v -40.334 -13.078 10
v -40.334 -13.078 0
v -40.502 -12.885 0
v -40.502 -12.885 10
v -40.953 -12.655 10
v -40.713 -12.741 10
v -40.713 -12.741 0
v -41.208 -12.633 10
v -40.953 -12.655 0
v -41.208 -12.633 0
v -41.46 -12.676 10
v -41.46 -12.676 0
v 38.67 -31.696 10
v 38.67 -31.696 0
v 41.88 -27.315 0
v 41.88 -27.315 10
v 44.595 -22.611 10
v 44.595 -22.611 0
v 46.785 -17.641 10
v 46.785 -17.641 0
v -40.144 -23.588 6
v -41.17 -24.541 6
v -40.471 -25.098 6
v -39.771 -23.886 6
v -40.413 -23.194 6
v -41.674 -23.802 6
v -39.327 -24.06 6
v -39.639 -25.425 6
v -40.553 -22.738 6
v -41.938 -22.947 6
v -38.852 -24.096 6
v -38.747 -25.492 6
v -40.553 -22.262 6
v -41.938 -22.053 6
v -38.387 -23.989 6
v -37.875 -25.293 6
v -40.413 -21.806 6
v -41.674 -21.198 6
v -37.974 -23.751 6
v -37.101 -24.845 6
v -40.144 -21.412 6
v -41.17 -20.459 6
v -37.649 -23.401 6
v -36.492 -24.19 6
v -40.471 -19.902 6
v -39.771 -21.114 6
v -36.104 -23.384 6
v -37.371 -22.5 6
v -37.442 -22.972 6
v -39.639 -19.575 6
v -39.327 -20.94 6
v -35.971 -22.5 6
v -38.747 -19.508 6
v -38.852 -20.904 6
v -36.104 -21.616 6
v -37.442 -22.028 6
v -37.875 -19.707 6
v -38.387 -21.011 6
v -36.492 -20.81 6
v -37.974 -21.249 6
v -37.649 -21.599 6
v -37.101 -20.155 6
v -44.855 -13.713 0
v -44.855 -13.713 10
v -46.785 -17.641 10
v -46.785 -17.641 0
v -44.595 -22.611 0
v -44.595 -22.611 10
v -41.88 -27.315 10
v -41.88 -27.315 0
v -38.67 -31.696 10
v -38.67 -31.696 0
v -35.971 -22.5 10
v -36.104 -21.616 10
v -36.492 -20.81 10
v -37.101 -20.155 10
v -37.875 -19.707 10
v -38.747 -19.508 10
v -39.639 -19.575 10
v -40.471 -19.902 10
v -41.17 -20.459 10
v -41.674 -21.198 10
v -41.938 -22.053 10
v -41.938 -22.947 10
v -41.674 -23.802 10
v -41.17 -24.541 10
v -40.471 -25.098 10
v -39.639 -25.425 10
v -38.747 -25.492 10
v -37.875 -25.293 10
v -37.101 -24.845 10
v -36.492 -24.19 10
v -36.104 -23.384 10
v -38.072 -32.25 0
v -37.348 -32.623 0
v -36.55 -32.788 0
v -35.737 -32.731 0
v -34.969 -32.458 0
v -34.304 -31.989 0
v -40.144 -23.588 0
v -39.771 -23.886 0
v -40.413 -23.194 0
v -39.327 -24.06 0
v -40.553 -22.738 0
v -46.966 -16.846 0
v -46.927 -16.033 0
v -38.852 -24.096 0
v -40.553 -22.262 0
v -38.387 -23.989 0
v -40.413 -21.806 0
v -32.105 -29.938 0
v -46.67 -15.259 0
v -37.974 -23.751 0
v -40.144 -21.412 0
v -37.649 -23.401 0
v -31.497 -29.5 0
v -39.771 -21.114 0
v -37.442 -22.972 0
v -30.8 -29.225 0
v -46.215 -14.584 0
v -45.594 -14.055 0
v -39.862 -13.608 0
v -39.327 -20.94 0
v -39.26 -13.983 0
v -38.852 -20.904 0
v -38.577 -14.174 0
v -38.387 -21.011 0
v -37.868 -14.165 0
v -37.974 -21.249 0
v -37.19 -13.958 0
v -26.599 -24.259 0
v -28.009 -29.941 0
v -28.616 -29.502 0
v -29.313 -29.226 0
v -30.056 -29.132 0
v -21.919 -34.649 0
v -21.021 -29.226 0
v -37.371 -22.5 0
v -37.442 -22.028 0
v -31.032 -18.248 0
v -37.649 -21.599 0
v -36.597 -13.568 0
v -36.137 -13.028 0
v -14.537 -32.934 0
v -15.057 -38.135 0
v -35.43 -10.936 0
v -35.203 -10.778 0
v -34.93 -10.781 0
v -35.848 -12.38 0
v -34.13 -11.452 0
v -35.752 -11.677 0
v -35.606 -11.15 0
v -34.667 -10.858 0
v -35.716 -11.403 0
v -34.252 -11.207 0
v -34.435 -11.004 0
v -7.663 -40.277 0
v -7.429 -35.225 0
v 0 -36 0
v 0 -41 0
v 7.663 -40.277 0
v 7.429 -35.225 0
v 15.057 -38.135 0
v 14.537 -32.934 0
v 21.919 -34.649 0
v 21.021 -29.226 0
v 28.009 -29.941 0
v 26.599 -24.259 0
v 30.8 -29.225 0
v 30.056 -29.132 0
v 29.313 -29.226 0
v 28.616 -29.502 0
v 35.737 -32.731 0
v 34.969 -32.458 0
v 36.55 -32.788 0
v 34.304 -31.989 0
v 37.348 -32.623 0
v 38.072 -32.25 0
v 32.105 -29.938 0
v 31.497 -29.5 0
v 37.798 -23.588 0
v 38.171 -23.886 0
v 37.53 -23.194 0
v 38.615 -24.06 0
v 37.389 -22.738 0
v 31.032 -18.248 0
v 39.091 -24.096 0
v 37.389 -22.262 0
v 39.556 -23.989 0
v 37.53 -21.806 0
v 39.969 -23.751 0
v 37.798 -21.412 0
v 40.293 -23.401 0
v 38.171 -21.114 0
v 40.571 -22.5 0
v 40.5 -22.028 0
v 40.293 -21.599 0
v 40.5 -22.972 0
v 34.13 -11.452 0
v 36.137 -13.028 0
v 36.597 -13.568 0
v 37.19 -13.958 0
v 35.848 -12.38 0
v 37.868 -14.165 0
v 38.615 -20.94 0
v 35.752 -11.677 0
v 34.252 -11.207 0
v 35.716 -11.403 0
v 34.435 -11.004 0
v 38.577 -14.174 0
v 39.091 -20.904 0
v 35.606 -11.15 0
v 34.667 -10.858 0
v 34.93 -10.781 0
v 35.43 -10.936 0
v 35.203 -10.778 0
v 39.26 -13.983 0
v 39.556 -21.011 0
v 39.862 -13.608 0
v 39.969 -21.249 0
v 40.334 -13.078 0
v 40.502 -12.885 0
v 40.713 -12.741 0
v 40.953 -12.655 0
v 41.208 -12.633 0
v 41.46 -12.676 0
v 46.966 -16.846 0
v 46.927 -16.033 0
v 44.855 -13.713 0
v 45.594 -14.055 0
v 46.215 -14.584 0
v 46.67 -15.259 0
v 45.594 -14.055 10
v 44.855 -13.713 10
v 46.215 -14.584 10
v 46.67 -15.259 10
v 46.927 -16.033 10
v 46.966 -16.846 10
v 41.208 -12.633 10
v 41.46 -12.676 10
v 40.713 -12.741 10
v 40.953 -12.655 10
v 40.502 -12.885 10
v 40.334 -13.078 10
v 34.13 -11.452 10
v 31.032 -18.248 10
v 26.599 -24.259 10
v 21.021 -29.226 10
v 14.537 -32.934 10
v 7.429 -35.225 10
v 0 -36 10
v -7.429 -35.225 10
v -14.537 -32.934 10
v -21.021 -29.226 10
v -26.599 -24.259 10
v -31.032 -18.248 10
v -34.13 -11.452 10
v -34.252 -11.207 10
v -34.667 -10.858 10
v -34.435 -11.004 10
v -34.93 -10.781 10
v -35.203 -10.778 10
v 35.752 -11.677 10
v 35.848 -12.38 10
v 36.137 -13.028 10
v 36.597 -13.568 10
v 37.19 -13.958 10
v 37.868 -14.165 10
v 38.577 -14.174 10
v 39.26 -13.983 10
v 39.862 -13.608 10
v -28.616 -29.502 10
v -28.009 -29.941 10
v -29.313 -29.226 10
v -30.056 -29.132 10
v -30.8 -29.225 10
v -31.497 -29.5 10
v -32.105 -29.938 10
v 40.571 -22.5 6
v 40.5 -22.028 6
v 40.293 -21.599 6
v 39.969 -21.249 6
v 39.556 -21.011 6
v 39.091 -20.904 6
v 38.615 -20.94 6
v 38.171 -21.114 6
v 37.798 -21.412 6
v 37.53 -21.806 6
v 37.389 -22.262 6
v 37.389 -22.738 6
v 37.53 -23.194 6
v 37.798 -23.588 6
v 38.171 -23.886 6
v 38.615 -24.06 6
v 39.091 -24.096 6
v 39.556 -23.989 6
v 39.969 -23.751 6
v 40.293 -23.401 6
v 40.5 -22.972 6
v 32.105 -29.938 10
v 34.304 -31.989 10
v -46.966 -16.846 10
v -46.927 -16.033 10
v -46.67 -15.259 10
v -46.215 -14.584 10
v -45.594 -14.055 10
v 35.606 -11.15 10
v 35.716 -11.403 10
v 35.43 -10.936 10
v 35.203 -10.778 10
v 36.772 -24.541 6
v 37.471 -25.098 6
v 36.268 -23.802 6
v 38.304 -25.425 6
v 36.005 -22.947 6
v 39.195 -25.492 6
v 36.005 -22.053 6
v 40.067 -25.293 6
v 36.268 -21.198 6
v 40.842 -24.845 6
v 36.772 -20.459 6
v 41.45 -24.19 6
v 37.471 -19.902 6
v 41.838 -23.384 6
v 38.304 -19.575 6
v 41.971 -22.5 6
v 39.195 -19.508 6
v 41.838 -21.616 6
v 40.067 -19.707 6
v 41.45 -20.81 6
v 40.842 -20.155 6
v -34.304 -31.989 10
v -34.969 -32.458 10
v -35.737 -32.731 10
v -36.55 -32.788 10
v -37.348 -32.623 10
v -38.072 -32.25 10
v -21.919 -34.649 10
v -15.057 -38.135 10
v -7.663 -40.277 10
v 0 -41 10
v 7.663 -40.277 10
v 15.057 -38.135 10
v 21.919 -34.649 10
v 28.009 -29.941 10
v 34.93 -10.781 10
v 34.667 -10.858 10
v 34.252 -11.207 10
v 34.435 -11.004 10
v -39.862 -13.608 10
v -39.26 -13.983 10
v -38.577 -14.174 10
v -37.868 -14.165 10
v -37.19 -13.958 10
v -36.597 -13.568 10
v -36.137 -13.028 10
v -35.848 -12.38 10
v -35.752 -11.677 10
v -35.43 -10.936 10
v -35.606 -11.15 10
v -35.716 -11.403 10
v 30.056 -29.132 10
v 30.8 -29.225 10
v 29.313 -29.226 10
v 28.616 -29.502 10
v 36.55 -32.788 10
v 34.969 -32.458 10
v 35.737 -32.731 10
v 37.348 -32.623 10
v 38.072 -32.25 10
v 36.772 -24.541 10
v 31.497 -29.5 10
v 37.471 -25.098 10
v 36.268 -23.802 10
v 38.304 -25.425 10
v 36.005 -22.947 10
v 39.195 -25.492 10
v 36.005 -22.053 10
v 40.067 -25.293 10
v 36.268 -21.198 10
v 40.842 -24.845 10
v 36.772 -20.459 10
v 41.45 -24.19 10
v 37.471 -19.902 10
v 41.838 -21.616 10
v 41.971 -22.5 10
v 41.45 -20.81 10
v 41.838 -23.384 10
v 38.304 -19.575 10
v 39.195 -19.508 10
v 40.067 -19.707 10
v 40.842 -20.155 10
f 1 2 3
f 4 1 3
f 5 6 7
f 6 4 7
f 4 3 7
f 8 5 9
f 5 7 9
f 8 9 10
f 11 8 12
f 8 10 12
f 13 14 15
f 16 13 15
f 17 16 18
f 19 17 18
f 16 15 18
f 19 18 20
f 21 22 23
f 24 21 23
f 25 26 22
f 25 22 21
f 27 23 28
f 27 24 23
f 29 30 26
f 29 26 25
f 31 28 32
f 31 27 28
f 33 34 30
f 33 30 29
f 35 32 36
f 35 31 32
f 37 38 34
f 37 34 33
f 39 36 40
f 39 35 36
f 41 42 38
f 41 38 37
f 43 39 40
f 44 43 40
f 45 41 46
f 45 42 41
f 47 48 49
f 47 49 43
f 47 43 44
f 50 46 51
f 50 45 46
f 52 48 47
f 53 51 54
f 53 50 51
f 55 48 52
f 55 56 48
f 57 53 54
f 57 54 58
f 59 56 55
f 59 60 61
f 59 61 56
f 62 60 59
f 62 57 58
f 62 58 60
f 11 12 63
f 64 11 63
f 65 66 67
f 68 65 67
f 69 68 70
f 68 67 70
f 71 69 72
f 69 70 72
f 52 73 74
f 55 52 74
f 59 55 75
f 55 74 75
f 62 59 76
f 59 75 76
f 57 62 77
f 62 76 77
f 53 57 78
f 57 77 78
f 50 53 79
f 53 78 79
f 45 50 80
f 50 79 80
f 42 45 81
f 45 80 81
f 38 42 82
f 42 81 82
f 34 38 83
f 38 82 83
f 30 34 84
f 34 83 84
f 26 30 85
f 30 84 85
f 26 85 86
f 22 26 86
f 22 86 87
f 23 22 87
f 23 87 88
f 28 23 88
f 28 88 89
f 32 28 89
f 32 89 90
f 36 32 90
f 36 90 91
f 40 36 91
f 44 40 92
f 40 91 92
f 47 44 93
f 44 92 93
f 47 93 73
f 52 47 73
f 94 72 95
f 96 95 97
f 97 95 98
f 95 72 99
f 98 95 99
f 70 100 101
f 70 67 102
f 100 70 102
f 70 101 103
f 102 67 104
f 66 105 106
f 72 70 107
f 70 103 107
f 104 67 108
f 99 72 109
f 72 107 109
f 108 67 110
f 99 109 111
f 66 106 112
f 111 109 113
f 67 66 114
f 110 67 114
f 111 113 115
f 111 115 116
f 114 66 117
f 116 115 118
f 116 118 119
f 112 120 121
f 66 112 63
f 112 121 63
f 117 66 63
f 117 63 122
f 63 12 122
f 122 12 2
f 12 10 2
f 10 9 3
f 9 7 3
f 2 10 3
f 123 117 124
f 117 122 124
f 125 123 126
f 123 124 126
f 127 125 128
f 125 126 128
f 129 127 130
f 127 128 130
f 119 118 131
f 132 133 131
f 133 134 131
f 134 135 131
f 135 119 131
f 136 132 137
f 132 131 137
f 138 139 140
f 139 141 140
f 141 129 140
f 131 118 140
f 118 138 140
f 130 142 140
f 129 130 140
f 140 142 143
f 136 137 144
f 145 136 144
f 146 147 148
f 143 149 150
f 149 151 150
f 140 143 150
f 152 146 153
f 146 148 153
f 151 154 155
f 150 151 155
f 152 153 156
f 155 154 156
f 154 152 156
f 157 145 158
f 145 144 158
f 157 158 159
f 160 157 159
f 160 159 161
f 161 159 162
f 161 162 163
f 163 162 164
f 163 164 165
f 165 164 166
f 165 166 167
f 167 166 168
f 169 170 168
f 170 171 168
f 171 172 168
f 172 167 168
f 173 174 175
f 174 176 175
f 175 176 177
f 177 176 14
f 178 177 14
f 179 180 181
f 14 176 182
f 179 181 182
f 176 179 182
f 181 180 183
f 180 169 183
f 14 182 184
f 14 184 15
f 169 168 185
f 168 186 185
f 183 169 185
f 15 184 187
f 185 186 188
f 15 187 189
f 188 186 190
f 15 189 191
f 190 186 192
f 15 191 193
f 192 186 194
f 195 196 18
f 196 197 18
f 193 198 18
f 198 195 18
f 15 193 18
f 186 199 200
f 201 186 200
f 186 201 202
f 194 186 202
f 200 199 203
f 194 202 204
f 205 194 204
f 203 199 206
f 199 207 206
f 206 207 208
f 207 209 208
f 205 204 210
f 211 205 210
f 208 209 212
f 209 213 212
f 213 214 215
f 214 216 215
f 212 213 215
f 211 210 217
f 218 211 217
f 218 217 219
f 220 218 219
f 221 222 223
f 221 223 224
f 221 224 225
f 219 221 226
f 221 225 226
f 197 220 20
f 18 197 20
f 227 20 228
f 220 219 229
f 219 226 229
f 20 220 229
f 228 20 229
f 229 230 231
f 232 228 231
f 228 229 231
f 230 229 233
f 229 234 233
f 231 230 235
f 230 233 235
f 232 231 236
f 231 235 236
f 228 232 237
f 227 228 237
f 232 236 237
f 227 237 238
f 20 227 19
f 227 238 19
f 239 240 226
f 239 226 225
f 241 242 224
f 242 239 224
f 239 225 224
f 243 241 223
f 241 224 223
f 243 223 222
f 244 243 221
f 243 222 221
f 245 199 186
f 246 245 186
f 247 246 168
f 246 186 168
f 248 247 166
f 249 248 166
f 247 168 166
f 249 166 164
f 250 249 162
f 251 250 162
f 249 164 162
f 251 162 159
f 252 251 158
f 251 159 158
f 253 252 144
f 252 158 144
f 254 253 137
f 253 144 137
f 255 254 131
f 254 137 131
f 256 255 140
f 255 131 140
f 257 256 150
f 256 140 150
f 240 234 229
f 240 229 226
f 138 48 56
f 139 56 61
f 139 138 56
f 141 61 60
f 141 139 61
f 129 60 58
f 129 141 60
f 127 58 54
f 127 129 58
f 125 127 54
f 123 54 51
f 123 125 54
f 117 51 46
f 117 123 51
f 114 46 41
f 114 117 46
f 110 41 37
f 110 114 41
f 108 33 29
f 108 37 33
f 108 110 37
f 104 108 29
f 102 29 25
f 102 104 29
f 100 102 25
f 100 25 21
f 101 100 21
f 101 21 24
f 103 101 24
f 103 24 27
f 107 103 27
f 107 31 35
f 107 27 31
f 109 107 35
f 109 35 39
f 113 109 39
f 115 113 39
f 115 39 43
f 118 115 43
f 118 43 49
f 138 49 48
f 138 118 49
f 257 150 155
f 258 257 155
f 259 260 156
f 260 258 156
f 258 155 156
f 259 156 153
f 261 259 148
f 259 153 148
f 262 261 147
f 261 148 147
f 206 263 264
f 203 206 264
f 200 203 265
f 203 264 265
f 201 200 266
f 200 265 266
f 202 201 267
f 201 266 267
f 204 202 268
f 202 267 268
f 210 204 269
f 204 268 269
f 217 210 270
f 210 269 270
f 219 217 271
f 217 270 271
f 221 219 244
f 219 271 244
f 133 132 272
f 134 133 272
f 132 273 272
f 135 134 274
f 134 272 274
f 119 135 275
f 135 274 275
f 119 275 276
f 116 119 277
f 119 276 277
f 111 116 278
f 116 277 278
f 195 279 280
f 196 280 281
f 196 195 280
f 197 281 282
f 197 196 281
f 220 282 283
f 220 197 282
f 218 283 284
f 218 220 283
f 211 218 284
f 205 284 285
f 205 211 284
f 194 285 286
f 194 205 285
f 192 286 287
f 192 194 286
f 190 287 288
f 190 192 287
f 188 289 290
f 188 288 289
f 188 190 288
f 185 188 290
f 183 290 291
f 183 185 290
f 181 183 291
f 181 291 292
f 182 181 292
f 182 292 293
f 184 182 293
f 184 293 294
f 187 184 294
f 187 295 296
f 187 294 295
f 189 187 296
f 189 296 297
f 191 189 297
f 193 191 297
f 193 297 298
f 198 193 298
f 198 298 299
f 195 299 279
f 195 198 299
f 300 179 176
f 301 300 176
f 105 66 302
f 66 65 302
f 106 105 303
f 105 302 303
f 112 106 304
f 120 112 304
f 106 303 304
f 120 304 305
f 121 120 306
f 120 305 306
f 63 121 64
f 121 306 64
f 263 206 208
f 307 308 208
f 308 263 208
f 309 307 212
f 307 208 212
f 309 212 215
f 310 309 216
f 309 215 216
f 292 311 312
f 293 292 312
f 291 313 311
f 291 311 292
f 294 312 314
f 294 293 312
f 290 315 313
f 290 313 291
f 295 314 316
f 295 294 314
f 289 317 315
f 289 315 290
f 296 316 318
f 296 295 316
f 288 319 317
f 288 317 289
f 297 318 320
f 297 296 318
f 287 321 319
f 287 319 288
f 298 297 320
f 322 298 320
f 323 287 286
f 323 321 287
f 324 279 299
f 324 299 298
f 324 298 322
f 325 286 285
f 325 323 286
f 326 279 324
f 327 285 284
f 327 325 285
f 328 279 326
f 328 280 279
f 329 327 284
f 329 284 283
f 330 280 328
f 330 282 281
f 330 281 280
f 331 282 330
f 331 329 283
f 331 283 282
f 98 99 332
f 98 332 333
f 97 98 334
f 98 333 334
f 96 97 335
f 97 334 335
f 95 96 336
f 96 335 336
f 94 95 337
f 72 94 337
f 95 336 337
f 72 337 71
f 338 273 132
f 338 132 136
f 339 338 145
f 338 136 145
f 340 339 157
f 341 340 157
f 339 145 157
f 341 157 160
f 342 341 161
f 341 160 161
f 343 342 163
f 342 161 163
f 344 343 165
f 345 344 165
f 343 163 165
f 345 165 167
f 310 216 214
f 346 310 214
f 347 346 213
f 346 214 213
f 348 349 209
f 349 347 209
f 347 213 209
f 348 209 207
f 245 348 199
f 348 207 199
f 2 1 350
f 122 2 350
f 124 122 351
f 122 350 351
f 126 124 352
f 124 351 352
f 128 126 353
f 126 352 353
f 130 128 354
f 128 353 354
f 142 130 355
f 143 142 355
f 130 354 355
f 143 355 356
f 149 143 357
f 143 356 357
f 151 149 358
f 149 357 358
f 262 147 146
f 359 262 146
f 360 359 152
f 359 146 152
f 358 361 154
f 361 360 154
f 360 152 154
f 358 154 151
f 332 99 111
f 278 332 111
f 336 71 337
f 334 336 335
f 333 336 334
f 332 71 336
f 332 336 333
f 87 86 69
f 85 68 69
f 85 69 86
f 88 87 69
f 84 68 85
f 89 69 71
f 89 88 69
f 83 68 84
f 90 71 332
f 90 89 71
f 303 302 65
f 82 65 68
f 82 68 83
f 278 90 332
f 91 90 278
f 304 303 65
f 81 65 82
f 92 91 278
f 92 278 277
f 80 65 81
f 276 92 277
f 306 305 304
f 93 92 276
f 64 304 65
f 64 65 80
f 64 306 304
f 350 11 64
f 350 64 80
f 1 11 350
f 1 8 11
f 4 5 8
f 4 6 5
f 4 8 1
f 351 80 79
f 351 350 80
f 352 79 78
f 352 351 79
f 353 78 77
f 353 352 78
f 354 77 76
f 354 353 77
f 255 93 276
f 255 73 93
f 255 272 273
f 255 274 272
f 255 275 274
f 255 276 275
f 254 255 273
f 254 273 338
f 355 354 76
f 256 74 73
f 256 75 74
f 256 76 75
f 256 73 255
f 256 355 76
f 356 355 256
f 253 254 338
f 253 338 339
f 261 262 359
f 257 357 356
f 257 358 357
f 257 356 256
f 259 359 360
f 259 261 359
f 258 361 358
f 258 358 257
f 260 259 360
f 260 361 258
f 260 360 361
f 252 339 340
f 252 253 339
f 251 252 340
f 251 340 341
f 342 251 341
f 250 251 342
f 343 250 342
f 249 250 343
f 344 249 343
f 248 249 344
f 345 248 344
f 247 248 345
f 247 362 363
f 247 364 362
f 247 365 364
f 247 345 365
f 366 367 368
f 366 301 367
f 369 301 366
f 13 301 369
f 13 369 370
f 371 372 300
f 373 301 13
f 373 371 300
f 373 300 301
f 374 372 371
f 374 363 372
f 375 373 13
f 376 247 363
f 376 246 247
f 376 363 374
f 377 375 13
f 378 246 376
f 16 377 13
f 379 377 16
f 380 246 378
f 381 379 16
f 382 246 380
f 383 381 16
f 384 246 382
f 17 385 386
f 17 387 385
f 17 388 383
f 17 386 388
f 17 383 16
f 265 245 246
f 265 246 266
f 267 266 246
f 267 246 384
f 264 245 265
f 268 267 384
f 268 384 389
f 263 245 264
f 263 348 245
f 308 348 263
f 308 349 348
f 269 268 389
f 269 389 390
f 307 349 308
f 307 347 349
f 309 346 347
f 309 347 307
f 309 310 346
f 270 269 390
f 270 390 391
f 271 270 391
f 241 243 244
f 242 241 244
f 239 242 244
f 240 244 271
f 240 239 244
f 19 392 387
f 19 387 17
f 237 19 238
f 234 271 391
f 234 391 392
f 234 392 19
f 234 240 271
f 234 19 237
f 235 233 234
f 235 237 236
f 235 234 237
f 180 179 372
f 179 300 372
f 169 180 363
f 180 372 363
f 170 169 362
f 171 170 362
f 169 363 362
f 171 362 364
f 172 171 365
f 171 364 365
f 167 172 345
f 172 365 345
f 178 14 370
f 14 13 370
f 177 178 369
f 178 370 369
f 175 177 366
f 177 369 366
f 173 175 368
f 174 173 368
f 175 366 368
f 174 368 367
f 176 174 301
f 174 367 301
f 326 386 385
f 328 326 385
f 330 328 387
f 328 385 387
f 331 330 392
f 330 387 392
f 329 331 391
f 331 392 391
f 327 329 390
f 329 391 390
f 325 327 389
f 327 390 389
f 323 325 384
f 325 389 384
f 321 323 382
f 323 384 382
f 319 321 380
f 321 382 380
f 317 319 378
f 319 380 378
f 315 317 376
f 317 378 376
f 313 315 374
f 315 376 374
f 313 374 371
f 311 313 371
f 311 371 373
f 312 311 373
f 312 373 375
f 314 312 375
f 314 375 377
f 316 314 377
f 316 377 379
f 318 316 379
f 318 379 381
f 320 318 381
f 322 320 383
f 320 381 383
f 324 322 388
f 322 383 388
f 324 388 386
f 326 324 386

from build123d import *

# Parameters (mm, degrees)
SKETCH_1_R          = 1.6
EXTRUDE_1_DEPTH     = 10
SKETCH_2_R          = 2.5
CUT_EXTRUDE_1_DEPTH = 64.775363313
SKETCH_3_R          = 3
CUT_EXTRUDE_2_DEPTH = 4
FILLET_4_R          = 1
FILLET_5_R          = 3


with BuildPart() as part:
    # 草图1 → 凸台-拉伸1 (new body)
    with BuildSketch(Plane.XY):
        with BuildLine():
            Line((-34.426971215, -10.52538137), (-47.815237798, -14.618585236))
            ThreePointArc((-47.815237798, -14.618585236), (-43.301270189, -25), (-36.567685081, -34.099918003))
            Line((-36.567685081, -34.099918003), (-29.985501766, -27.961932763))
            ThreePointArc((-29.985501766, -27.961932763), (0, -41), (29.985501766, -27.961932763))
            Line((29.985501766, -27.961932763), (36.567685081, -34.099918003))
            ThreePointArc((36.567685081, -34.099918003), (43.301270189, -25), (47.815237798, -14.618585236))
            Line((47.815237798, -14.618585236), (34.426971215, -10.52538137))
            ThreePointArc((34.426971215, -10.52538137), (0, -36), (-34.426971215, -10.52538137))
        make_face()
        with Locations((-38.97114317, -22.5)):
            Circle(SKETCH_1_R, mode=Mode.SUBTRACT)
        with Locations((38.97114317, -22.5)):
            Circle(SKETCH_1_R, mode=Mode.SUBTRACT)
    extrude(amount=EXTRUDE_1_DEPTH)

    # 草图2 → 切除-拉伸1 (cut, through all)
    with BuildSketch(Plane.XY.offset(10)):
        with Locations((-38.252190239, -11.694868189)):
            Circle(SKETCH_2_R)
        with Locations((38.252190239, -11.694868189)):
            Circle(SKETCH_2_R)
    extrude(amount=-CUT_EXTRUDE_1_DEPTH, mode=Mode.SUBTRACT)

    # 草图3 → 切除-拉伸2 (cut)
    with BuildSketch(Plane.XY.offset(10)):
        with Locations((-38.97114317, -22.5)):
            Circle(SKETCH_3_R)
        with Locations((38.97114317, -22.5)):
            Circle(SKETCH_3_R)
    extrude(amount=-CUT_EXTRUDE_2_DEPTH, mode=Mode.SUBTRACT)

    # 圆角4
    # the kernel refuses this fillet: 1 mm, written as the material it takes off along each edge
    with BuildSketch(Plane(origin=(-34.426971215, -10.52538137, -2.466210045), x_dir=(-0.9563047559630324, -0.2923717047227467, 0), z_dir=(0, 0, 1))) as fillet_4_piece_1:
        with BuildLine():
            CenterArc((0.986484018, 1), FILLET_4_R, 181.548723167, 88.451276833)
            ThreePointArc((-0.013150685, 0.972972973), (-0.003287821, 0.486530921), (0, 0))
            Line((0, 0), (0.986484018, 0))
        make_face()
    extrude(amount=14.932420089, mode=Mode.SUBTRACT)
    with BuildSketch(Plane(origin=(34.426971215, -10.52538137, -2.466210045), x_dir=(-0.30526922048074906, -0.9522660883529749, 0), z_dir=(0, 0, 1))) as fillet_4_piece_2:
        with BuildLine():
            CenterArc((0.986576589, 0.999908672), FILLET_4_R, 180.774361584, 88.451276833)
            Line((-0.013332083, 0.986393924), (0, 0))
            ThreePointArc((0, 0), (0.486530921, 0.003287821), (0.973061841, 0))
        make_face()
    extrude(amount=14.932420089, mode=Mode.SUBTRACT)
    with BuildSketch(Plane(origin=(-40.642952128, -12.425797451, -2.135254916), x_dir=(0.42737008907787555, -0.9040767705021342, 0), z_dir=(0, 0, 1)), Plane(origin=(35.861428349, -10.963938927, -2.135254916), x_dir=(-0.1512474530257889, -0.9884959321885001, 0), z_dir=(0, 0, 1))) as fillet_4_piece_3:
        with BuildLine():
            CenterArc((0.866217493, -0.989523837), FILLET_4_R, 98.3007748, 73.398450401)
            Line((-0.123306344, -0.845154255), (0, 0))
            ThreePointArc((0, 0), (0.360923955, -0.026190408), (0.721847911, 0))
        make_face()
    extrude(amount=14.270509831, mode=Mode.SUBTRACT)
    with BuildSketch(Plane(origin=(-35.861428349, -10.963938927, -2.135254916), x_dir=(0.9563047559630329, 0.29237170472274493, 0), z_dir=(0, 0, 1)), Plane(origin=(40.642952128, -12.425797451, -2.135254916), x_dir=(0.9563047559630371, -0.2923717047227312, 0), z_dir=(0, 0, 1))) as fillet_4_piece_4:
        with BuildLine():
            CenterArc((0.854101966, -1), FILLET_4_R, 90, 73.398450401)
            ThreePointArc((-0.104212881, -0.714285714), (-0.026190408, -0.360923955), (0, 0))
            Line((0, 0), (0.854101966, 0))
        make_face()
    extrude(amount=14.270509831, mode=Mode.SUBTRACT)

    # 圆角5
    fillet_5_edges = [part.edges().sort_by_distance(p)[0] for p in [
        (-47.815237798, -14.618585236, 5),
        (47.815237798, -14.618585236, 5),
        (36.567685081, -34.099918003, 5),
        (29.985501766, -27.961932763, 5),
        (-29.985501766, -27.961932763, 5),
        (-36.567685081, -34.099918003, 5),
    ]]
    fillet(fillet_5_edges, radius=FILLET_5_R)


solid = part.part
